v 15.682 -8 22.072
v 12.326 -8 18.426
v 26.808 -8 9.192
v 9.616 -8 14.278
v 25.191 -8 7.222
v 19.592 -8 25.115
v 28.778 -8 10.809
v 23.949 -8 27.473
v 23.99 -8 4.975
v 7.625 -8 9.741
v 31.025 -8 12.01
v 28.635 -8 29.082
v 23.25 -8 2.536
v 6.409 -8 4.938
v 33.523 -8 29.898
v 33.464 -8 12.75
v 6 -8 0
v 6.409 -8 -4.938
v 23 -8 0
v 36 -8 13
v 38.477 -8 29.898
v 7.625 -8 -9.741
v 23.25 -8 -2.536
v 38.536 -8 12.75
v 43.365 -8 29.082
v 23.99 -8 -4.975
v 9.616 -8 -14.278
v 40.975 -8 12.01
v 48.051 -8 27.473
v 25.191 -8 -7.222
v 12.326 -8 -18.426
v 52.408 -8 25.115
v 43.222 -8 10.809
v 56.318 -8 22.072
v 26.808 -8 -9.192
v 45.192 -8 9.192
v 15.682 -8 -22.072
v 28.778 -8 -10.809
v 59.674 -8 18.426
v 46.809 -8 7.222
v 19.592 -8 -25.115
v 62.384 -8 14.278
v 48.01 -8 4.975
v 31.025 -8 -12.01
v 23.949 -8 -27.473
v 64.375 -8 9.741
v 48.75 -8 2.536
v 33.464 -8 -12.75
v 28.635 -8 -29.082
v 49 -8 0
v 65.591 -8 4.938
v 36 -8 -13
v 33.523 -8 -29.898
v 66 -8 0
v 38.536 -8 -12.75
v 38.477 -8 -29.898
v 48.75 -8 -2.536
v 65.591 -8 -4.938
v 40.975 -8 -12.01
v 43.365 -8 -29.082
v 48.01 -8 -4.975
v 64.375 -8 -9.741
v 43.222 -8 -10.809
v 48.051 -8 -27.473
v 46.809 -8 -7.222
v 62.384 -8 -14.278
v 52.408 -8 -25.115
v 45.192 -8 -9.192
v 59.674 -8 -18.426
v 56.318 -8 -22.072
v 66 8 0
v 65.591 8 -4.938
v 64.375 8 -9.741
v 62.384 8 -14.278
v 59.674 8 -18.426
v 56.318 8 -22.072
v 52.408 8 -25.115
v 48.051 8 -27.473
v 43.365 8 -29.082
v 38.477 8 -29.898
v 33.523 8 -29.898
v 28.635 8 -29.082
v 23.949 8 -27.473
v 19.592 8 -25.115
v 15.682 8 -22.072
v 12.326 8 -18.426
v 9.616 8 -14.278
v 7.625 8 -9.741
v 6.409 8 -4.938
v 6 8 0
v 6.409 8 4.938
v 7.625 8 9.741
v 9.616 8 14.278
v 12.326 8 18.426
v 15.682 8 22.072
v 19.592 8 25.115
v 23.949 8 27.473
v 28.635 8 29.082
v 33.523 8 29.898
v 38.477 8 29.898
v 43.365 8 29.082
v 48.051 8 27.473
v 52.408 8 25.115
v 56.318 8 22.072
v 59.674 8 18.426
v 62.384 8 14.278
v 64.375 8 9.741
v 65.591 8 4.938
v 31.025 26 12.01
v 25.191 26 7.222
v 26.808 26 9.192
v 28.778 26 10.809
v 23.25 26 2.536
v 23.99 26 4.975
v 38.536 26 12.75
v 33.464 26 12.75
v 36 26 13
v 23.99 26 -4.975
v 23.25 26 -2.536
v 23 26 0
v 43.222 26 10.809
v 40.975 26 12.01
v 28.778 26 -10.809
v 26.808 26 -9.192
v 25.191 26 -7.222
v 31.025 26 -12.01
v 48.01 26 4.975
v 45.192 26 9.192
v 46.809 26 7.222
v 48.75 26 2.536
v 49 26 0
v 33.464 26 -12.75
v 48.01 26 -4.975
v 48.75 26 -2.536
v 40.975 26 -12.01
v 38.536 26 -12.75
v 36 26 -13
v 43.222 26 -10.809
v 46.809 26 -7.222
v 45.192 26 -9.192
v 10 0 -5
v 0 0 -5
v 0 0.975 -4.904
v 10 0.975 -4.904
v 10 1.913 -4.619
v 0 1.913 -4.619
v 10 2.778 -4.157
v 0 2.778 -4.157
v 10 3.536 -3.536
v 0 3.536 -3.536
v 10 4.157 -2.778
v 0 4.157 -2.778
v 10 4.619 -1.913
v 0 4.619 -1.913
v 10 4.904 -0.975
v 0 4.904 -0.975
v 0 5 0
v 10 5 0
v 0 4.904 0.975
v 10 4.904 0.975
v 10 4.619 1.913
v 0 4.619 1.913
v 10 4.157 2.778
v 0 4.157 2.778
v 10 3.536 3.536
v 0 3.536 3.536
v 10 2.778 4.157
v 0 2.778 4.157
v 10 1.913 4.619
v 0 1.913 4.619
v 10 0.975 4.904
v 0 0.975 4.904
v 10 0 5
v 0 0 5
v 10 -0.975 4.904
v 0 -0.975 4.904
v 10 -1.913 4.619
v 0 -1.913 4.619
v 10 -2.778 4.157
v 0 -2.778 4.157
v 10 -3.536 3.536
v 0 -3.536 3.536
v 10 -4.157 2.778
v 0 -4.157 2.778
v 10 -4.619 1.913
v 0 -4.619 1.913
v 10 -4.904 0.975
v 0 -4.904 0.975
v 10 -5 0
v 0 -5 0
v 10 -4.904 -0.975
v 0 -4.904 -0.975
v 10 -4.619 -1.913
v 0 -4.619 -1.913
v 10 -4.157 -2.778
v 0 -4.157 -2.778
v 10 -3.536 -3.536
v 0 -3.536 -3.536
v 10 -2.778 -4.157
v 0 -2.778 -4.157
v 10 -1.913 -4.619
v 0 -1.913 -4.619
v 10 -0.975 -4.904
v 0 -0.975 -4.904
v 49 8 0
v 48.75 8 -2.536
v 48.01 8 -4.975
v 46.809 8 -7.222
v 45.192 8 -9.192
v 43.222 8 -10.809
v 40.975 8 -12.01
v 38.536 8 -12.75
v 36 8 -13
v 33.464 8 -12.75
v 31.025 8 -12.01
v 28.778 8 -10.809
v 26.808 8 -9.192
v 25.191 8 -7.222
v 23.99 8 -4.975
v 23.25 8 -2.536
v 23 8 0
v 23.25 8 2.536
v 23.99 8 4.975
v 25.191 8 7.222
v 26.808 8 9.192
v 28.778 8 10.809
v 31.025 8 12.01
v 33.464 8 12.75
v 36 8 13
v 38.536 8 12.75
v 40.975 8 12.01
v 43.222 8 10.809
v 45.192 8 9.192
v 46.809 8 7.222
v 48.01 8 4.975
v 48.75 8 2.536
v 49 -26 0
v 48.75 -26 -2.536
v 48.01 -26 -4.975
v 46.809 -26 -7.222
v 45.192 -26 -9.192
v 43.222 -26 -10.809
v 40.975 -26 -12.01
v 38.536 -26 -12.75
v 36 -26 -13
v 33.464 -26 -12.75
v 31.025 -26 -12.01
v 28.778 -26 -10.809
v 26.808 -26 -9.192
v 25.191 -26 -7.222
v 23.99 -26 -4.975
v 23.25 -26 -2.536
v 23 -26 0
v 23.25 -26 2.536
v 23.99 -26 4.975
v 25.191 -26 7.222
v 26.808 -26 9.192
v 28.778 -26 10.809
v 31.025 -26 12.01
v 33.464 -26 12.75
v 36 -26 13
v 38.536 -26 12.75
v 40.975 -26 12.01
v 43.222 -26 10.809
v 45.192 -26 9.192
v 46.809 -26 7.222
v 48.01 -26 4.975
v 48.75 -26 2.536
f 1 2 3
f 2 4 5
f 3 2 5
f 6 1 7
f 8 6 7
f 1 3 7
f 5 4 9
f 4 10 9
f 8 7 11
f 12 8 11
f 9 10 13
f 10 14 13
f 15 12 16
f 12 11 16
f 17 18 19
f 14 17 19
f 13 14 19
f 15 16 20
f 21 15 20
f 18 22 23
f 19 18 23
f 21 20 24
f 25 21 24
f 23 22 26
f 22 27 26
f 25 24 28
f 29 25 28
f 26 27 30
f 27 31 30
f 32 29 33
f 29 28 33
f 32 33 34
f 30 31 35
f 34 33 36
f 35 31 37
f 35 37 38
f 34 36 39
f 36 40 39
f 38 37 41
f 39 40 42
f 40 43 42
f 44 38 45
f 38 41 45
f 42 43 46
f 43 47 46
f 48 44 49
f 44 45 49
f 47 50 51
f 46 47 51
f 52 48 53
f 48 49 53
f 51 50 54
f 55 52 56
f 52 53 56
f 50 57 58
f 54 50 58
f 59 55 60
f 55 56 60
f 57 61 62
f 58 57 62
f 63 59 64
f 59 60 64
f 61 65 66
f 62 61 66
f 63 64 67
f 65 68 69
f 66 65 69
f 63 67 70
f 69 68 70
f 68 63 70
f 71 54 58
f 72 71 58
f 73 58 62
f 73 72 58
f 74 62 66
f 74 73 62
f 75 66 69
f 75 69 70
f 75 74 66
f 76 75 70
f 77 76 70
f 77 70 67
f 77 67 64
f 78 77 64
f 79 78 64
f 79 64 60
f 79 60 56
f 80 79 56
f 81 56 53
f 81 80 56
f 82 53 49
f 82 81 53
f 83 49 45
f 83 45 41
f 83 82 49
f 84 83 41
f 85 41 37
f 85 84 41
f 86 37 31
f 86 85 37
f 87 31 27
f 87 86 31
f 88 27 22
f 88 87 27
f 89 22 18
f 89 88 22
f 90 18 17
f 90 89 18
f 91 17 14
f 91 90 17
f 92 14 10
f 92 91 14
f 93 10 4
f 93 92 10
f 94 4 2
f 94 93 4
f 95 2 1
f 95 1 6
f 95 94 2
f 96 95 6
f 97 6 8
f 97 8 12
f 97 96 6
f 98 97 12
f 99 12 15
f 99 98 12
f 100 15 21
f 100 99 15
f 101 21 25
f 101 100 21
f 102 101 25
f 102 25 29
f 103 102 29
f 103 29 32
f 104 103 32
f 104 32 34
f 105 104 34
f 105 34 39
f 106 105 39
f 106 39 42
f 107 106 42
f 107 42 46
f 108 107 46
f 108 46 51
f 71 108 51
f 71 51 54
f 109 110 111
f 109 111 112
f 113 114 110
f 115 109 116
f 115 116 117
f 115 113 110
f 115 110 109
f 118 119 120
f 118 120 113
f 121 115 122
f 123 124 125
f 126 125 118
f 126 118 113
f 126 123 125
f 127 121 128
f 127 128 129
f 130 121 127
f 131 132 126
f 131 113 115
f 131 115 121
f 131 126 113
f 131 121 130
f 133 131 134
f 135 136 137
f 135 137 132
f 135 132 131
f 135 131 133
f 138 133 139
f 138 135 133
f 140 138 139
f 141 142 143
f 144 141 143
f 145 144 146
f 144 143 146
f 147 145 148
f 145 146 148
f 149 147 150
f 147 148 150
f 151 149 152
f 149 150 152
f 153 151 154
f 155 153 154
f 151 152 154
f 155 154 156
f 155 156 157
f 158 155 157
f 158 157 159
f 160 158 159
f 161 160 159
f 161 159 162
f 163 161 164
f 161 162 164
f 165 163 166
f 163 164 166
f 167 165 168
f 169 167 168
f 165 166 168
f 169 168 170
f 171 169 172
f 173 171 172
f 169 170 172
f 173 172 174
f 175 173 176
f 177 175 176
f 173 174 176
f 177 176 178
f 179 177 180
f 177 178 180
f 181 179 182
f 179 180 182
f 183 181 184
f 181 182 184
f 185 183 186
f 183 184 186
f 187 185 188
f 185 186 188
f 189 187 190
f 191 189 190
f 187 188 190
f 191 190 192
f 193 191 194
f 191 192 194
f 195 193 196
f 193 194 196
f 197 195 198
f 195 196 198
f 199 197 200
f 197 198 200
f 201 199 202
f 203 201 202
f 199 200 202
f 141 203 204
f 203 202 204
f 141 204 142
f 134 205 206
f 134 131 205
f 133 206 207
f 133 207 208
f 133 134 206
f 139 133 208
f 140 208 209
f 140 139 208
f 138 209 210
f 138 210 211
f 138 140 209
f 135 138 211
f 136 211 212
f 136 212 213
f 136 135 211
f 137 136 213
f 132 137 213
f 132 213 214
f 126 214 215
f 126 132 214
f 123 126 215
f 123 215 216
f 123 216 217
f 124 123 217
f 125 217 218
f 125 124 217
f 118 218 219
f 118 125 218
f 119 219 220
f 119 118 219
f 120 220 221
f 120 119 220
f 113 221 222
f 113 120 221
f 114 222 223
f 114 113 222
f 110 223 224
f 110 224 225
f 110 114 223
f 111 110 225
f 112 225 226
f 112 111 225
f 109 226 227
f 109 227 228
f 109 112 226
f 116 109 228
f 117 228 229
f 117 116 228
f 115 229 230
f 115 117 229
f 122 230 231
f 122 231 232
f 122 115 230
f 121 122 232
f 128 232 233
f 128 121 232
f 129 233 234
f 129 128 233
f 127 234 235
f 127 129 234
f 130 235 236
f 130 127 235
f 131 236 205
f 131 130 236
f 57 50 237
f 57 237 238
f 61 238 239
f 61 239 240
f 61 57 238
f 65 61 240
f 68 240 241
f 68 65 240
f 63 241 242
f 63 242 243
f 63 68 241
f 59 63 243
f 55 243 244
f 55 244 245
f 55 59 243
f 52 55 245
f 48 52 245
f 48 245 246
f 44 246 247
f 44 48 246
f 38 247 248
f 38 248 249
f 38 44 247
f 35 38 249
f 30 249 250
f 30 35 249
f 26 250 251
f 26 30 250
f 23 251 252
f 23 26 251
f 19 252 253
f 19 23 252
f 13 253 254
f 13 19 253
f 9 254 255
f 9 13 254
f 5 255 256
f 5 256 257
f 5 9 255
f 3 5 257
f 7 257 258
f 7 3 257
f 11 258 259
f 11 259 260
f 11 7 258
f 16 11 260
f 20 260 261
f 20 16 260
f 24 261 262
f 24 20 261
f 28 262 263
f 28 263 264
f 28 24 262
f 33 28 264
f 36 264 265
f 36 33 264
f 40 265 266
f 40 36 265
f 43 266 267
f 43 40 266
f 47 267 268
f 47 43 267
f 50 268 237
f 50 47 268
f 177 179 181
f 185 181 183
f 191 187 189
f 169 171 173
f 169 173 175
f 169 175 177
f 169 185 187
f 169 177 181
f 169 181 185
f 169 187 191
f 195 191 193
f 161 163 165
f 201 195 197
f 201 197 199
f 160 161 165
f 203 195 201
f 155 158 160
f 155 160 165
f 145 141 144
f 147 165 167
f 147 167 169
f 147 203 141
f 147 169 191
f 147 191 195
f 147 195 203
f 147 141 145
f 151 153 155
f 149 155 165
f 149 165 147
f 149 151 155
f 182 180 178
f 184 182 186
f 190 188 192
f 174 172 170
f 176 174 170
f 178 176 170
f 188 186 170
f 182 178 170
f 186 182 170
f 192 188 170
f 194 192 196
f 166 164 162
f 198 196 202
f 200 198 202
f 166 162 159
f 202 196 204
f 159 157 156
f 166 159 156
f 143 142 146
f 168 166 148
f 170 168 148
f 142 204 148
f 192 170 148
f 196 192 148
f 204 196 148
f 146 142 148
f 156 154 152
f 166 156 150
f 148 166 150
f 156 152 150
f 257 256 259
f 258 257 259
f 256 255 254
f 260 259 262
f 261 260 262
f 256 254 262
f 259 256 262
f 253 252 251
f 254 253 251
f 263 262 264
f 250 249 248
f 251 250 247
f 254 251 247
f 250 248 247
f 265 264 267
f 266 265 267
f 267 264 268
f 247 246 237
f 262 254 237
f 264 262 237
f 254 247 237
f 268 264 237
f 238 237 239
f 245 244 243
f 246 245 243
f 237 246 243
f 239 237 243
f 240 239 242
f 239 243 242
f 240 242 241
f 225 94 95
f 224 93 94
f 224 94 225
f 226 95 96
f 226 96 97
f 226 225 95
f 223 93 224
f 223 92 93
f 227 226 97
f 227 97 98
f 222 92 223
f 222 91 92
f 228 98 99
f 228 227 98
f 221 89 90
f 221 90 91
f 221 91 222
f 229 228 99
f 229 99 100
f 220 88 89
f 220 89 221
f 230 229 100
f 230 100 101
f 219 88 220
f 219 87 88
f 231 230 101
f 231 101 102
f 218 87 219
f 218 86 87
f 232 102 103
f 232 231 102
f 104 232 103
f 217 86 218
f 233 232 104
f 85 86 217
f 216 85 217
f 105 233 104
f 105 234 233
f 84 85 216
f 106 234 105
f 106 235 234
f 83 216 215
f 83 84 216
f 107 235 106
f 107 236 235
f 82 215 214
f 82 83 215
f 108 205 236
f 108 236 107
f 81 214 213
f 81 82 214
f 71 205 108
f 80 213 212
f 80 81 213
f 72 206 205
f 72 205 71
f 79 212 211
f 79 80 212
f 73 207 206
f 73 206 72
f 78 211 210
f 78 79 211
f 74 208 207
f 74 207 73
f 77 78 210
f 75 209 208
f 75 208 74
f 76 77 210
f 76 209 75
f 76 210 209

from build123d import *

# Parameters (mm, degrees)
SKETCH1_R           = 5
BOSS_EXTRUDE1_DEPTH = 10
SKETCH4_R           = 30
BOSS_EXTRUDE4_DEPTH = 8
SKETCH5_R           = 13
BOSS_EXTRUDE5_DEPTH = 26


with BuildPart() as part:
    # Sketch1 → Boss-Extrude1 (new body)
    with BuildSketch(Plane(origin=(0, 0, 0), x_dir=(0, 0, -1), z_dir=(1, 0, 0))):
        Circle(SKETCH1_R)
    extrude(amount=BOSS_EXTRUDE1_DEPTH)


with BuildPart() as body_2:
    # Sketch4 → Boss-Extrude4 (new body, symmetric)
    with BuildSketch(Plane(origin=(0, 0, 0), x_dir=(1, 0, 0), z_dir=(0, 1, 0))):
        with Locations((36, 0)):
            Circle(SKETCH4_R)
    extrude(amount=BOSS_EXTRUDE4_DEPTH, both=True)

    # Sketch5 → Boss-Extrude5 (add, symmetric)
    with BuildSketch(Plane(origin=(0, 0, 0), x_dir=(1, 0, 0), z_dir=(0, 1, 0))):
        with Locations((36, 0)):
            Circle(SKETCH5_R)
    extrude(amount=BOSS_EXTRUDE5_DEPTH, both=True)


solid = Compound([part.part, body_2.part])
